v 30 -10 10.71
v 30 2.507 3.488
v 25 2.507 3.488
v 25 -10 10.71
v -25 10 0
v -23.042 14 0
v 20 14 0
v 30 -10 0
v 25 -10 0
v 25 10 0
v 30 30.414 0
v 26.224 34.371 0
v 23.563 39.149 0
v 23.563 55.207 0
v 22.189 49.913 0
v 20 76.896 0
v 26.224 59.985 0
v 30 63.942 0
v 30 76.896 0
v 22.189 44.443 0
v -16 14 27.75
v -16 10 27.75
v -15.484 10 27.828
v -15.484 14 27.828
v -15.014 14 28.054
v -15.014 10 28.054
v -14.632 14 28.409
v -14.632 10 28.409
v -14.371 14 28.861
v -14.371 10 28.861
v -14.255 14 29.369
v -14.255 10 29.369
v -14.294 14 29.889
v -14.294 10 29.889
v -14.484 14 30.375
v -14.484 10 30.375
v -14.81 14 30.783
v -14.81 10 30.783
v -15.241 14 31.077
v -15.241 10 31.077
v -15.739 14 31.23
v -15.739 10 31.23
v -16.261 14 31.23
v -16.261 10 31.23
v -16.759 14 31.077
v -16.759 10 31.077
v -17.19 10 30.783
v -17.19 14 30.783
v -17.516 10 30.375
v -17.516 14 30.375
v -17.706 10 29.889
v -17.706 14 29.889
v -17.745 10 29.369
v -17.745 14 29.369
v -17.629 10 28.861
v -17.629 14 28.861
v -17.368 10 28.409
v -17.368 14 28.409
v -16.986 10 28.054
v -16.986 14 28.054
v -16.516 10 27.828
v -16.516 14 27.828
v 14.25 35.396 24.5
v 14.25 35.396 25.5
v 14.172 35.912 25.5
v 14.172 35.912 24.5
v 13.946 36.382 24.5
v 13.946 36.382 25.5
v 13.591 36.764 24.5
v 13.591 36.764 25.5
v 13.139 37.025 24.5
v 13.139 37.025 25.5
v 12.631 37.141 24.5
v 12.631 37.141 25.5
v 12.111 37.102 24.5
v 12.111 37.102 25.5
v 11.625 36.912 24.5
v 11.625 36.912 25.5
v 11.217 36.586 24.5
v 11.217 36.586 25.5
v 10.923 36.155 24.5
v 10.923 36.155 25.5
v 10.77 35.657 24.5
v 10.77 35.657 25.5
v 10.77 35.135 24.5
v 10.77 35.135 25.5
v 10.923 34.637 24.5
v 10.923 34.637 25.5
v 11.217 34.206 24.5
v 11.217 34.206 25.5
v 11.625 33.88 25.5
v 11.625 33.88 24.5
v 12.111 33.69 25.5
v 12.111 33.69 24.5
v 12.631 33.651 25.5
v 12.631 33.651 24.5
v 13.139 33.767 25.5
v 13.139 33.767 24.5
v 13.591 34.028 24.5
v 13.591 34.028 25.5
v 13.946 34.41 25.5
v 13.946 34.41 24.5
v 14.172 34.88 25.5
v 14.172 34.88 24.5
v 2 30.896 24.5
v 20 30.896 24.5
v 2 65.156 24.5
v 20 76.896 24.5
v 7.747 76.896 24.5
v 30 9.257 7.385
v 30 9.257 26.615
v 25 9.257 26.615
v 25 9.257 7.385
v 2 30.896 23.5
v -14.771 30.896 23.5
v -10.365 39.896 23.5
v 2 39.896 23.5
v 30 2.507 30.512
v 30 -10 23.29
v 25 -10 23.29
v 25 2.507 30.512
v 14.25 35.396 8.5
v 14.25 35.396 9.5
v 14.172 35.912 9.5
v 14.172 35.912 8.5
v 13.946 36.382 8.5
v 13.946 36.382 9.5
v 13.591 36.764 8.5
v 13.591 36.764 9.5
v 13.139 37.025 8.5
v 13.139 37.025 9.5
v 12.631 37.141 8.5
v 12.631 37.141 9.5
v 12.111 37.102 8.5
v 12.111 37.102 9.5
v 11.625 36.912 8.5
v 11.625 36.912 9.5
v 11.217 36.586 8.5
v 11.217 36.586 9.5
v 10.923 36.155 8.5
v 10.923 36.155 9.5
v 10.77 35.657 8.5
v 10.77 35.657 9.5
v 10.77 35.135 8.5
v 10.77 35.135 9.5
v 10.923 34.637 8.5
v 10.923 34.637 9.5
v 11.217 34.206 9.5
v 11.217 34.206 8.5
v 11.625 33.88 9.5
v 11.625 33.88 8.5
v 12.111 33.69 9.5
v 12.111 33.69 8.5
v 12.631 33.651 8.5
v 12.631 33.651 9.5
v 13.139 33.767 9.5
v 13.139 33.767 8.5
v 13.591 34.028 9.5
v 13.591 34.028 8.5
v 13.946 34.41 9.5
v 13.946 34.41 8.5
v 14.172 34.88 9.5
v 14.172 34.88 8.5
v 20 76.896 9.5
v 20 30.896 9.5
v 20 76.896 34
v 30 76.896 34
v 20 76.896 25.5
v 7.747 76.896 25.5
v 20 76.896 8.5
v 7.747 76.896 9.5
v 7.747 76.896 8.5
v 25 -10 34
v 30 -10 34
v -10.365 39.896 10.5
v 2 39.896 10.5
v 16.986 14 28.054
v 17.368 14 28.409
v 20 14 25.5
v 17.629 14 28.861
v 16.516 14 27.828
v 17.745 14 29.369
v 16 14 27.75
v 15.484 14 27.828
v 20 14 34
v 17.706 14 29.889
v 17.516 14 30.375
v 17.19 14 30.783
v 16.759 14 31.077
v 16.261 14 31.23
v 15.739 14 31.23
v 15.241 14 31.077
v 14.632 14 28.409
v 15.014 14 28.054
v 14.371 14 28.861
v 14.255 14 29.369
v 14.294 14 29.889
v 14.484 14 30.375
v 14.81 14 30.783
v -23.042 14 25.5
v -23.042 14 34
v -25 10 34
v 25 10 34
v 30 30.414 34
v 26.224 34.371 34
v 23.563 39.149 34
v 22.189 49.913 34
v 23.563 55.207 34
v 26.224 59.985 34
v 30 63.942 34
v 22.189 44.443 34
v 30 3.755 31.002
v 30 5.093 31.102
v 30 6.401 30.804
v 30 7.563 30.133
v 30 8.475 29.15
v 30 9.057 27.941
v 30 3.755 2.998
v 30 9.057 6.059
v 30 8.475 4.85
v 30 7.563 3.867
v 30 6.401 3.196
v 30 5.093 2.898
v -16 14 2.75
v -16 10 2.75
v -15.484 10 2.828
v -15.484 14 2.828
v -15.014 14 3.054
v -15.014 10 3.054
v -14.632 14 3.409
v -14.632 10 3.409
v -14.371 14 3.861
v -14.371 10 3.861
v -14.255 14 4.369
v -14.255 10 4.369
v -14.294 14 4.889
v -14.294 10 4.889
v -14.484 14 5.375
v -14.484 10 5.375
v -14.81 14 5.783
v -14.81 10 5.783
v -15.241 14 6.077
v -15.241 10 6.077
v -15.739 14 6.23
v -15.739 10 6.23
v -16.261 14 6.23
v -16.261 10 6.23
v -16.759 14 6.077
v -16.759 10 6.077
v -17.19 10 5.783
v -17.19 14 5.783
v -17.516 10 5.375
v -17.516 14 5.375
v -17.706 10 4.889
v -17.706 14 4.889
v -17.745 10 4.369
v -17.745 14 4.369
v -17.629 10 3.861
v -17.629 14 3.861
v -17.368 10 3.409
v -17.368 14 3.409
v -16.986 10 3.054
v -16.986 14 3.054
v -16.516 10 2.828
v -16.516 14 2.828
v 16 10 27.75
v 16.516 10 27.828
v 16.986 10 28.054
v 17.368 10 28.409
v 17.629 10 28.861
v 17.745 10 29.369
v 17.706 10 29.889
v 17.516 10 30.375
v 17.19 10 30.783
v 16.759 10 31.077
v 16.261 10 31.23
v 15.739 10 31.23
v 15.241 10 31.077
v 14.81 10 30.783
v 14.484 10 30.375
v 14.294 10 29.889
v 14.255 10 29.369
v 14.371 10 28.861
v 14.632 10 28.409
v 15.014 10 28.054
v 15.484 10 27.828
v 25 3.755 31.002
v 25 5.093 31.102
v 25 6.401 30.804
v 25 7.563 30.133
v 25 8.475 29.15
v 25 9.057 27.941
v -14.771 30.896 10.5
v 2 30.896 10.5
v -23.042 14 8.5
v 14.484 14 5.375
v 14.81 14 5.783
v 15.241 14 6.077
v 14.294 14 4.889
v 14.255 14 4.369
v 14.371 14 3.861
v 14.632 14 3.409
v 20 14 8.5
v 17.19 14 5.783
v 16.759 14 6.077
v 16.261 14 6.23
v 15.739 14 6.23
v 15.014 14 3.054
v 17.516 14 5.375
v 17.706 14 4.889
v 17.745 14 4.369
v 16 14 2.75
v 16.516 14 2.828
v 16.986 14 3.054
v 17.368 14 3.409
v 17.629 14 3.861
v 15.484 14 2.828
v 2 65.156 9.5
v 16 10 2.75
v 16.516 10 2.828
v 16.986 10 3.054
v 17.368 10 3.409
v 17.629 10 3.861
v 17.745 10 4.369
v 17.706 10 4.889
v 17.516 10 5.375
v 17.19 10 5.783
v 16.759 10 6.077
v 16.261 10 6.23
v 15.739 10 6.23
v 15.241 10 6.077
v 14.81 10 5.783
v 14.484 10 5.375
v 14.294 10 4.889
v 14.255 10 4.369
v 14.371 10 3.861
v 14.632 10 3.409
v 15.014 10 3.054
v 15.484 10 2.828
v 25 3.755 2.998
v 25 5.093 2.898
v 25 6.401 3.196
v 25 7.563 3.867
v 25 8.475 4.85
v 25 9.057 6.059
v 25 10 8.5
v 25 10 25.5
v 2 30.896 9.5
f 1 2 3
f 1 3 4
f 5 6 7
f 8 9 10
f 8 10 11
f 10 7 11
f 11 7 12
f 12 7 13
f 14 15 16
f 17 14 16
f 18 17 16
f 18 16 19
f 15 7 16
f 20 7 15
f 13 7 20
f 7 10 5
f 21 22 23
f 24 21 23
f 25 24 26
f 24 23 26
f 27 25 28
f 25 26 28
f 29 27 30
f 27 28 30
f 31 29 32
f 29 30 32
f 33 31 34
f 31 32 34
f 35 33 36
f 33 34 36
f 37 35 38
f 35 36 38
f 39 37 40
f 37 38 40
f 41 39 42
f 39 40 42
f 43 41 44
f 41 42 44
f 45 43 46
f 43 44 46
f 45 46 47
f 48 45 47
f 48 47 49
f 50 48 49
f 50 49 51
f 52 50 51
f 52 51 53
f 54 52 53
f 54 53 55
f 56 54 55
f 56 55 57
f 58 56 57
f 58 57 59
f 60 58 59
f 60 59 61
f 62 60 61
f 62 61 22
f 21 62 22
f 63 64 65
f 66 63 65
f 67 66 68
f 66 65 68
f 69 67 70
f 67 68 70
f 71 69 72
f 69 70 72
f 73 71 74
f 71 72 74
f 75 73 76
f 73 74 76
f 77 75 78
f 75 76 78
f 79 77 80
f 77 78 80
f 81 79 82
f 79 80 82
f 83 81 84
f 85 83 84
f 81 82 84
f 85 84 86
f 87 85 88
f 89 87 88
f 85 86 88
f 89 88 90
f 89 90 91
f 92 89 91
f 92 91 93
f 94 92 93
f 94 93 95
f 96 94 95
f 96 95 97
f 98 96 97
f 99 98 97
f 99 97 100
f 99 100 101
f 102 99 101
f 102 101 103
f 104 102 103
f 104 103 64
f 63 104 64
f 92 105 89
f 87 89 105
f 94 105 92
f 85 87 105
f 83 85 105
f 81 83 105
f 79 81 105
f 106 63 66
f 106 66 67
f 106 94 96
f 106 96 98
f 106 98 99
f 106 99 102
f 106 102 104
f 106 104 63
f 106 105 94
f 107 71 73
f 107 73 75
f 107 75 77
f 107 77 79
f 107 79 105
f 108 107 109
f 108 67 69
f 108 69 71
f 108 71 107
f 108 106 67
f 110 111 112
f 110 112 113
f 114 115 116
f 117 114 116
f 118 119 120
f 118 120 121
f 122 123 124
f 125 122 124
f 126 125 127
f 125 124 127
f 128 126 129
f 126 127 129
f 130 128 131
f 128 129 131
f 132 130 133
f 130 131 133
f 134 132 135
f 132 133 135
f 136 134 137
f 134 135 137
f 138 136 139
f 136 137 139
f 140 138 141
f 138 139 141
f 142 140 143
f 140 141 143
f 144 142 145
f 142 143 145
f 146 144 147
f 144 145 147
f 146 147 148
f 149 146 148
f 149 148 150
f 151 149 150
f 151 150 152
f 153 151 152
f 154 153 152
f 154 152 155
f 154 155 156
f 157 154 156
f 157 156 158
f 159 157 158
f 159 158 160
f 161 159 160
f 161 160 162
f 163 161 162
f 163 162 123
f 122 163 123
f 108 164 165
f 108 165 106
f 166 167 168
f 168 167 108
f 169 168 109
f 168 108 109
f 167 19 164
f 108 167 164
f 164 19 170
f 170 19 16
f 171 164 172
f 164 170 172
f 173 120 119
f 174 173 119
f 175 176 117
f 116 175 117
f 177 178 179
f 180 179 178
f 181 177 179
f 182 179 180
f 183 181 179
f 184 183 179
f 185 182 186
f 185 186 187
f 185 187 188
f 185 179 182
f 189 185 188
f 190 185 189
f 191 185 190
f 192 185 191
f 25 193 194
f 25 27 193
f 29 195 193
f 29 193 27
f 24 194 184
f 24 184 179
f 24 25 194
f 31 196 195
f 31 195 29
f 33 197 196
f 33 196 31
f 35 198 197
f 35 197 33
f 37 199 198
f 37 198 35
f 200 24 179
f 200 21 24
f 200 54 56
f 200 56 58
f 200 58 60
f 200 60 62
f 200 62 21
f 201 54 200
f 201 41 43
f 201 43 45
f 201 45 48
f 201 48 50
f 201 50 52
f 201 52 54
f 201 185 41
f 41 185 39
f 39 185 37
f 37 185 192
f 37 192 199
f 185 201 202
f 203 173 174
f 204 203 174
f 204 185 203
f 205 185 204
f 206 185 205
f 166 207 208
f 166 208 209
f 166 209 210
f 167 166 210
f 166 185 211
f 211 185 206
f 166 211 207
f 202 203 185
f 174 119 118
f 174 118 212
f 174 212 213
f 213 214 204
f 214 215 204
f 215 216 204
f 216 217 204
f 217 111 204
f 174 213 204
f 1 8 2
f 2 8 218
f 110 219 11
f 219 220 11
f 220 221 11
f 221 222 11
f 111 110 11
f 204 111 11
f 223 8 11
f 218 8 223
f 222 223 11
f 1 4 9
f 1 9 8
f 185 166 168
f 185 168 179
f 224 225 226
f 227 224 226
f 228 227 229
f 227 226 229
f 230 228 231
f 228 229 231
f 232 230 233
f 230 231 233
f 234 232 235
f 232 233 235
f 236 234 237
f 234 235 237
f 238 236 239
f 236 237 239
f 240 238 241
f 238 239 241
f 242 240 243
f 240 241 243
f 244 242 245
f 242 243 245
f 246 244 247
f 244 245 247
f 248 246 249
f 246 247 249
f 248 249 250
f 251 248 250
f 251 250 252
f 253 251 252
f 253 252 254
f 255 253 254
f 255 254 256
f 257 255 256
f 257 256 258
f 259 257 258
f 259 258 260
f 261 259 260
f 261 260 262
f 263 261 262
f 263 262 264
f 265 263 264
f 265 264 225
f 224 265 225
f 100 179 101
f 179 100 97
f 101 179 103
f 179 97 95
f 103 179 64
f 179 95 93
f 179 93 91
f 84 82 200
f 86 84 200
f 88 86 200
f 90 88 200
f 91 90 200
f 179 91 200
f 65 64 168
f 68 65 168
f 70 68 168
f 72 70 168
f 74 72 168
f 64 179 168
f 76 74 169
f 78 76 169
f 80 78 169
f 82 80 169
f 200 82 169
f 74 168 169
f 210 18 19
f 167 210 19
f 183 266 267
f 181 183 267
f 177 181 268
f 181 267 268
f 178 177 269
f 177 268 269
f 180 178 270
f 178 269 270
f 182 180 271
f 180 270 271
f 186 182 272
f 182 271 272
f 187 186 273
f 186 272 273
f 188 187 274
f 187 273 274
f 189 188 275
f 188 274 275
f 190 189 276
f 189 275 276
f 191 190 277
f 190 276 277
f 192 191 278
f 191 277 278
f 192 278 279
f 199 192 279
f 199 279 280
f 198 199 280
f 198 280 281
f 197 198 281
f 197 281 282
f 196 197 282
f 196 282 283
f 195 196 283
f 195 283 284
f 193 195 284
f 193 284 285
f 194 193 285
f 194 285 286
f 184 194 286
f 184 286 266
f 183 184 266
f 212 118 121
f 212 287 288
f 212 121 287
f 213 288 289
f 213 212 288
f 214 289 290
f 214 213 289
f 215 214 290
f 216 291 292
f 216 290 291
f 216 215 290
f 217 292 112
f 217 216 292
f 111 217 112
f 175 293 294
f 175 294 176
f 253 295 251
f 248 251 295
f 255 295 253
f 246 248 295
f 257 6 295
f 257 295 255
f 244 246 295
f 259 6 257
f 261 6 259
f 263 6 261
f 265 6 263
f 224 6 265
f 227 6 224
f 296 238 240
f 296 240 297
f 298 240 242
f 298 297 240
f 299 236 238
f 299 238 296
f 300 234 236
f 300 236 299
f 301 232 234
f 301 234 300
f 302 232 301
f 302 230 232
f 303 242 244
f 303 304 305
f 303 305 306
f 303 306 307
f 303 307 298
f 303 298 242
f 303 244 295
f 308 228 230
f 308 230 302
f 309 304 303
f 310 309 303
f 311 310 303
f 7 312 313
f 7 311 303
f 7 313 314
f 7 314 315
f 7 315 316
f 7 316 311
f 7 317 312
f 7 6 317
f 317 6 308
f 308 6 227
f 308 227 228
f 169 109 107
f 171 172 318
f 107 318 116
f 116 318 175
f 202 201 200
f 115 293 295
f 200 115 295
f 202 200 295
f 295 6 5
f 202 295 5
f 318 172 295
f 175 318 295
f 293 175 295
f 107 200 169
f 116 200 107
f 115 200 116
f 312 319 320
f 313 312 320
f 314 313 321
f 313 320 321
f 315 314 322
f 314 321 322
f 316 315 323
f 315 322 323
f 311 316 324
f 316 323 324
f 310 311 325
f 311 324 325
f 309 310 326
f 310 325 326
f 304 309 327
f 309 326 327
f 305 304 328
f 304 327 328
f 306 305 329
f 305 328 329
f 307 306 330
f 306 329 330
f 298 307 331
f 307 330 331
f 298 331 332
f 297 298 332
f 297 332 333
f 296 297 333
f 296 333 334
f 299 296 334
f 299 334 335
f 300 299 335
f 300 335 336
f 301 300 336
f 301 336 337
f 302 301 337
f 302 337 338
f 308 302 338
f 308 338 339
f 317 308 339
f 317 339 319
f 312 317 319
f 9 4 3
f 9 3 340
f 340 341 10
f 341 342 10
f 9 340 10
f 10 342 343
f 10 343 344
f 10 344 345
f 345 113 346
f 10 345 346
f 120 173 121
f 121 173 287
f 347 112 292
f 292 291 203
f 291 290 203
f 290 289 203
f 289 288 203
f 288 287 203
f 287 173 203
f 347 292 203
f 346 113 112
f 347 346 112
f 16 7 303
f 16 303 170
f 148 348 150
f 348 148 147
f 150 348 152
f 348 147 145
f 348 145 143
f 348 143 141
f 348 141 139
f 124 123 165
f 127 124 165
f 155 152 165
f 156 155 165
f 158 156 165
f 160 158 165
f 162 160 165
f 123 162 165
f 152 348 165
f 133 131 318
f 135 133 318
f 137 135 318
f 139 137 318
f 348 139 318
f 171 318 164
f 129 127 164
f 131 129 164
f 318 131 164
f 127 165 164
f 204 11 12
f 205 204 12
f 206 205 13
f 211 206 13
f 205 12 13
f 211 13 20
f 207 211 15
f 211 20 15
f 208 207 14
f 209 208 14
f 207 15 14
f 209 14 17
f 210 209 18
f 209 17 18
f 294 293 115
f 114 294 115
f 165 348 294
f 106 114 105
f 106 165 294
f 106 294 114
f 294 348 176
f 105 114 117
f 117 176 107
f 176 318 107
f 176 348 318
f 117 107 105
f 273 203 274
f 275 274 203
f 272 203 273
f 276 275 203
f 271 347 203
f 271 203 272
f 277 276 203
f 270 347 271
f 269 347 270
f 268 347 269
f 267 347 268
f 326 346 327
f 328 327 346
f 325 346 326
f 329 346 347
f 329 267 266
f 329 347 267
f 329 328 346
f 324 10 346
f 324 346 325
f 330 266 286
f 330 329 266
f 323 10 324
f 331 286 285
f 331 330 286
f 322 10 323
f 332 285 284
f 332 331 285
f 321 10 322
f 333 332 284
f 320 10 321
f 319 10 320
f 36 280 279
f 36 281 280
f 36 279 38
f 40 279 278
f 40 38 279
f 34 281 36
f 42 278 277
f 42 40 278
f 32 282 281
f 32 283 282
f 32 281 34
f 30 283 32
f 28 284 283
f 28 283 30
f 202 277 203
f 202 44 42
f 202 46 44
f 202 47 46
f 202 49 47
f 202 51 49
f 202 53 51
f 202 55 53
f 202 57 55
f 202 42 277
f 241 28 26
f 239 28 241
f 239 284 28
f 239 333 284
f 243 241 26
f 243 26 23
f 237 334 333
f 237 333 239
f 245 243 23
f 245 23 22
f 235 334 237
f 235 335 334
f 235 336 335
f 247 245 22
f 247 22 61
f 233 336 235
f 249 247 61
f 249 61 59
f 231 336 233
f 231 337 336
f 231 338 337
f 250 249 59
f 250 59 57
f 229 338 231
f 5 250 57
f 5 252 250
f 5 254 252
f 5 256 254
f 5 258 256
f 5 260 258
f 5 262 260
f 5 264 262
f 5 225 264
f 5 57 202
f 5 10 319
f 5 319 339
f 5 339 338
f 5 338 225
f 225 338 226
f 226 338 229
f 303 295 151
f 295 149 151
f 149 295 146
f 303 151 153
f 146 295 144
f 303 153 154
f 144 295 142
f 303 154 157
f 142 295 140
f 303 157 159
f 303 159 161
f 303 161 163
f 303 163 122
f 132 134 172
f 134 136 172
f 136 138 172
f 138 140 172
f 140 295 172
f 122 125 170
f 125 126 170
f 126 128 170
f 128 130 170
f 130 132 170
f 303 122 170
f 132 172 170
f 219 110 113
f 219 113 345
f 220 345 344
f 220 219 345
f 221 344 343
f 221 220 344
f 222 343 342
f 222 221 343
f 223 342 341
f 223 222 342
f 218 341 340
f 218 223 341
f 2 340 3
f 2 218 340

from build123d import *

# Parameters (mm, degrees)
BOSS_EXTRUDE2_DEPTH = 34
SKETCH5_W           = 50
SKETCH5_H           = 20
CUT_EXTRUDE1_DEPTH  = 8.5
SKETCH6_W           = 50
SKETCH6_H           = 20
CUT_EXTRUDE2_DEPTH  = 8.5
SKETCH7_W           = 52.006330756
SKETCH7_H           = 21.627895193
CUT_EXTRUDE3_DEPTH  = 87.390073596
CUT_EXTRUDE4_DEPTH  = 101.468874862
SKETCH10_R          = 1.75
CUT_EXTRUDE5_DEPTH  = 10
SKETCH14_W          = 15
SKETCH14_H          = 37
CUT_EXTRUDE8_DEPTH  = 18
SKETCH15_W          = 18
SKETCH15_H          = 15
CUT_EXTRUDE9_DEPTH  = 9
SKETCH16_W          = 13
SKETCH16_H          = 9
CUT_EXTRUDE10_DEPTH = 96.362439231
SKETCH17_R          = 1.75
CUT_EXTRUDE11_DEPTH = 87.390073596


with BuildPart() as part:
    # Sketch4 → Boss-Extrude2 (new body)
    with BuildSketch(Plane.XY):
        with BuildLine():
            Line((-25, -10), (30, -10))
            Line((30, -10), (30, 30.414))
            ThreePointArc((30, 30.414), (22.015013929, 47.178), (30, 63.942))
            Line((30, 63.942), (30, 76.896))
            Line((30, 76.896), (7.747226033, 76.896))
            Line((7.747226033, 76.896), (-25, 10))
            Line((-25, 10), (-25, -10))
        make_face()
    extrude(amount=BOSS_EXTRUDE2_DEPTH)

    # Sketch5 → Cut-Extrude1 (cut)
    with BuildSketch(Plane.XY.offset(34)):
        Polygon((-23.041902294, 14), (7.747226033, 76.896), (20, 76.896), (20, 14), align=None)
        Rectangle(SKETCH5_W, SKETCH5_H)
    extrude(amount=-CUT_EXTRUDE1_DEPTH, mode=Mode.SUBTRACT)

    # Sketch6 → Cut-Extrude2 (cut)
    with BuildSketch(Plane(origin=(0, 0, 0), x_dir=(-1, 0, 0), z_dir=(0, 0, -1))):
        Polygon((23.041902294, 14), (-20, 14), (-20, 76.896), (-7.747226033, 76.896), align=None)
        Rectangle(SKETCH6_W, SKETCH6_H)
    extrude(amount=-CUT_EXTRUDE2_DEPTH, mode=Mode.SUBTRACT)

    # Sketch7 → Cut-Extrude3 (cut, through all)
    with BuildSketch(Plane(origin=(0, 0, 8.5), x_dir=(-1, 0, 0), z_dir=(0, 0, -1))):
        with Locations((1.003165378, -0.813947597)):
            Rectangle(SKETCH7_W, SKETCH7_H)
    extrude(amount=-CUT_EXTRUDE3_DEPTH, mode=Mode.SUBTRACT)

    # Sketch9 → Cut-Extrude4 (cut, through all)
    with BuildSketch(Plane(origin=(30, 0, 0), x_dir=(0, 0, -1), z_dir=(1, 0, 0))):
        with BuildLine():
            Line((-26.615, 9.257), (-7.385, 9.257))
            ThreePointArc((-7.385, 9.257), (-3.487778361, 7.006814103), (-3.488100353, 2.506628222))
            Line((-3.488100353, 2.506628222), (-13.103100353, -14.143371778))
            ThreePointArc((-13.103100353, -14.143371778), (-17, -16.393), (-20.896899647, -14.143371778))
            Line((-20.896899647, -14.143371778), (-30.511899647, 2.506628222))
            ThreePointArc((-30.511899647, 2.506628222), (-30.512221639, 7.006814103), (-26.615, 9.257))
        make_face()
    extrude(amount=-CUT_EXTRUDE4_DEPTH, mode=Mode.SUBTRACT)

    # Sketch10 → Cut-Extrude5 (cut)
    with BuildSketch(Plane.XZ.offset(-10)):
        with Locations(Location((16, 29.5, 0), (0, 0, 270))):
            Circle(SKETCH10_R)
        with Locations(Location((16, 4.5, 0), (0, 0, 270))):
            Circle(SKETCH10_R)
        with Locations(Location((-16, 29.5, 0), (0, 0, 270))):
            Circle(SKETCH10_R)
        with Locations(Location((-16, 4.5, 0), (0, 0, 270))):
            Circle(SKETCH10_R)
    extrude(amount=-CUT_EXTRUDE5_DEPTH, mode=Mode.SUBTRACT)

    # Sketch14 → Cut-Extrude8 (cut)
    with BuildSketch(Plane.ZY.offset(-20)):
        with Locations((17, 58.396)):
            Rectangle(SKETCH14_W, SKETCH14_H)
    extrude(amount=CUT_EXTRUDE8_DEPTH, mode=Mode.SUBTRACT)

    # Sketch15 → Cut-Extrude9 (cut)
    with BuildSketch(Plane(origin=(0, 39.896, 0), x_dir=(1, 0, 0), z_dir=(0, 1, 0))):
        with Locations((11, -17)):
            Rectangle(SKETCH15_W, SKETCH15_H)
    extrude(amount=-CUT_EXTRUDE9_DEPTH, mode=Mode.SUBTRACT)

    # Sketch16 → Cut-Extrude10 (cut, through all)
    with BuildSketch(Plane.ZY.offset(-20)):
        with Locations((17, 35.396)):
            Rectangle(SKETCH16_W, SKETCH16_H)
    extrude(amount=CUT_EXTRUDE10_DEPTH, mode=Mode.SUBTRACT)

    # Sketch17 → Cut-Extrude11 (cut, through all)
    with BuildSketch(Plane.XY.offset(25.5)):
        with Locations((12.5, 35.396)):
            Circle(SKETCH17_R)
    extrude(amount=-CUT_EXTRUDE11_DEPTH, mode=Mode.SUBTRACT)


solid = part.part
